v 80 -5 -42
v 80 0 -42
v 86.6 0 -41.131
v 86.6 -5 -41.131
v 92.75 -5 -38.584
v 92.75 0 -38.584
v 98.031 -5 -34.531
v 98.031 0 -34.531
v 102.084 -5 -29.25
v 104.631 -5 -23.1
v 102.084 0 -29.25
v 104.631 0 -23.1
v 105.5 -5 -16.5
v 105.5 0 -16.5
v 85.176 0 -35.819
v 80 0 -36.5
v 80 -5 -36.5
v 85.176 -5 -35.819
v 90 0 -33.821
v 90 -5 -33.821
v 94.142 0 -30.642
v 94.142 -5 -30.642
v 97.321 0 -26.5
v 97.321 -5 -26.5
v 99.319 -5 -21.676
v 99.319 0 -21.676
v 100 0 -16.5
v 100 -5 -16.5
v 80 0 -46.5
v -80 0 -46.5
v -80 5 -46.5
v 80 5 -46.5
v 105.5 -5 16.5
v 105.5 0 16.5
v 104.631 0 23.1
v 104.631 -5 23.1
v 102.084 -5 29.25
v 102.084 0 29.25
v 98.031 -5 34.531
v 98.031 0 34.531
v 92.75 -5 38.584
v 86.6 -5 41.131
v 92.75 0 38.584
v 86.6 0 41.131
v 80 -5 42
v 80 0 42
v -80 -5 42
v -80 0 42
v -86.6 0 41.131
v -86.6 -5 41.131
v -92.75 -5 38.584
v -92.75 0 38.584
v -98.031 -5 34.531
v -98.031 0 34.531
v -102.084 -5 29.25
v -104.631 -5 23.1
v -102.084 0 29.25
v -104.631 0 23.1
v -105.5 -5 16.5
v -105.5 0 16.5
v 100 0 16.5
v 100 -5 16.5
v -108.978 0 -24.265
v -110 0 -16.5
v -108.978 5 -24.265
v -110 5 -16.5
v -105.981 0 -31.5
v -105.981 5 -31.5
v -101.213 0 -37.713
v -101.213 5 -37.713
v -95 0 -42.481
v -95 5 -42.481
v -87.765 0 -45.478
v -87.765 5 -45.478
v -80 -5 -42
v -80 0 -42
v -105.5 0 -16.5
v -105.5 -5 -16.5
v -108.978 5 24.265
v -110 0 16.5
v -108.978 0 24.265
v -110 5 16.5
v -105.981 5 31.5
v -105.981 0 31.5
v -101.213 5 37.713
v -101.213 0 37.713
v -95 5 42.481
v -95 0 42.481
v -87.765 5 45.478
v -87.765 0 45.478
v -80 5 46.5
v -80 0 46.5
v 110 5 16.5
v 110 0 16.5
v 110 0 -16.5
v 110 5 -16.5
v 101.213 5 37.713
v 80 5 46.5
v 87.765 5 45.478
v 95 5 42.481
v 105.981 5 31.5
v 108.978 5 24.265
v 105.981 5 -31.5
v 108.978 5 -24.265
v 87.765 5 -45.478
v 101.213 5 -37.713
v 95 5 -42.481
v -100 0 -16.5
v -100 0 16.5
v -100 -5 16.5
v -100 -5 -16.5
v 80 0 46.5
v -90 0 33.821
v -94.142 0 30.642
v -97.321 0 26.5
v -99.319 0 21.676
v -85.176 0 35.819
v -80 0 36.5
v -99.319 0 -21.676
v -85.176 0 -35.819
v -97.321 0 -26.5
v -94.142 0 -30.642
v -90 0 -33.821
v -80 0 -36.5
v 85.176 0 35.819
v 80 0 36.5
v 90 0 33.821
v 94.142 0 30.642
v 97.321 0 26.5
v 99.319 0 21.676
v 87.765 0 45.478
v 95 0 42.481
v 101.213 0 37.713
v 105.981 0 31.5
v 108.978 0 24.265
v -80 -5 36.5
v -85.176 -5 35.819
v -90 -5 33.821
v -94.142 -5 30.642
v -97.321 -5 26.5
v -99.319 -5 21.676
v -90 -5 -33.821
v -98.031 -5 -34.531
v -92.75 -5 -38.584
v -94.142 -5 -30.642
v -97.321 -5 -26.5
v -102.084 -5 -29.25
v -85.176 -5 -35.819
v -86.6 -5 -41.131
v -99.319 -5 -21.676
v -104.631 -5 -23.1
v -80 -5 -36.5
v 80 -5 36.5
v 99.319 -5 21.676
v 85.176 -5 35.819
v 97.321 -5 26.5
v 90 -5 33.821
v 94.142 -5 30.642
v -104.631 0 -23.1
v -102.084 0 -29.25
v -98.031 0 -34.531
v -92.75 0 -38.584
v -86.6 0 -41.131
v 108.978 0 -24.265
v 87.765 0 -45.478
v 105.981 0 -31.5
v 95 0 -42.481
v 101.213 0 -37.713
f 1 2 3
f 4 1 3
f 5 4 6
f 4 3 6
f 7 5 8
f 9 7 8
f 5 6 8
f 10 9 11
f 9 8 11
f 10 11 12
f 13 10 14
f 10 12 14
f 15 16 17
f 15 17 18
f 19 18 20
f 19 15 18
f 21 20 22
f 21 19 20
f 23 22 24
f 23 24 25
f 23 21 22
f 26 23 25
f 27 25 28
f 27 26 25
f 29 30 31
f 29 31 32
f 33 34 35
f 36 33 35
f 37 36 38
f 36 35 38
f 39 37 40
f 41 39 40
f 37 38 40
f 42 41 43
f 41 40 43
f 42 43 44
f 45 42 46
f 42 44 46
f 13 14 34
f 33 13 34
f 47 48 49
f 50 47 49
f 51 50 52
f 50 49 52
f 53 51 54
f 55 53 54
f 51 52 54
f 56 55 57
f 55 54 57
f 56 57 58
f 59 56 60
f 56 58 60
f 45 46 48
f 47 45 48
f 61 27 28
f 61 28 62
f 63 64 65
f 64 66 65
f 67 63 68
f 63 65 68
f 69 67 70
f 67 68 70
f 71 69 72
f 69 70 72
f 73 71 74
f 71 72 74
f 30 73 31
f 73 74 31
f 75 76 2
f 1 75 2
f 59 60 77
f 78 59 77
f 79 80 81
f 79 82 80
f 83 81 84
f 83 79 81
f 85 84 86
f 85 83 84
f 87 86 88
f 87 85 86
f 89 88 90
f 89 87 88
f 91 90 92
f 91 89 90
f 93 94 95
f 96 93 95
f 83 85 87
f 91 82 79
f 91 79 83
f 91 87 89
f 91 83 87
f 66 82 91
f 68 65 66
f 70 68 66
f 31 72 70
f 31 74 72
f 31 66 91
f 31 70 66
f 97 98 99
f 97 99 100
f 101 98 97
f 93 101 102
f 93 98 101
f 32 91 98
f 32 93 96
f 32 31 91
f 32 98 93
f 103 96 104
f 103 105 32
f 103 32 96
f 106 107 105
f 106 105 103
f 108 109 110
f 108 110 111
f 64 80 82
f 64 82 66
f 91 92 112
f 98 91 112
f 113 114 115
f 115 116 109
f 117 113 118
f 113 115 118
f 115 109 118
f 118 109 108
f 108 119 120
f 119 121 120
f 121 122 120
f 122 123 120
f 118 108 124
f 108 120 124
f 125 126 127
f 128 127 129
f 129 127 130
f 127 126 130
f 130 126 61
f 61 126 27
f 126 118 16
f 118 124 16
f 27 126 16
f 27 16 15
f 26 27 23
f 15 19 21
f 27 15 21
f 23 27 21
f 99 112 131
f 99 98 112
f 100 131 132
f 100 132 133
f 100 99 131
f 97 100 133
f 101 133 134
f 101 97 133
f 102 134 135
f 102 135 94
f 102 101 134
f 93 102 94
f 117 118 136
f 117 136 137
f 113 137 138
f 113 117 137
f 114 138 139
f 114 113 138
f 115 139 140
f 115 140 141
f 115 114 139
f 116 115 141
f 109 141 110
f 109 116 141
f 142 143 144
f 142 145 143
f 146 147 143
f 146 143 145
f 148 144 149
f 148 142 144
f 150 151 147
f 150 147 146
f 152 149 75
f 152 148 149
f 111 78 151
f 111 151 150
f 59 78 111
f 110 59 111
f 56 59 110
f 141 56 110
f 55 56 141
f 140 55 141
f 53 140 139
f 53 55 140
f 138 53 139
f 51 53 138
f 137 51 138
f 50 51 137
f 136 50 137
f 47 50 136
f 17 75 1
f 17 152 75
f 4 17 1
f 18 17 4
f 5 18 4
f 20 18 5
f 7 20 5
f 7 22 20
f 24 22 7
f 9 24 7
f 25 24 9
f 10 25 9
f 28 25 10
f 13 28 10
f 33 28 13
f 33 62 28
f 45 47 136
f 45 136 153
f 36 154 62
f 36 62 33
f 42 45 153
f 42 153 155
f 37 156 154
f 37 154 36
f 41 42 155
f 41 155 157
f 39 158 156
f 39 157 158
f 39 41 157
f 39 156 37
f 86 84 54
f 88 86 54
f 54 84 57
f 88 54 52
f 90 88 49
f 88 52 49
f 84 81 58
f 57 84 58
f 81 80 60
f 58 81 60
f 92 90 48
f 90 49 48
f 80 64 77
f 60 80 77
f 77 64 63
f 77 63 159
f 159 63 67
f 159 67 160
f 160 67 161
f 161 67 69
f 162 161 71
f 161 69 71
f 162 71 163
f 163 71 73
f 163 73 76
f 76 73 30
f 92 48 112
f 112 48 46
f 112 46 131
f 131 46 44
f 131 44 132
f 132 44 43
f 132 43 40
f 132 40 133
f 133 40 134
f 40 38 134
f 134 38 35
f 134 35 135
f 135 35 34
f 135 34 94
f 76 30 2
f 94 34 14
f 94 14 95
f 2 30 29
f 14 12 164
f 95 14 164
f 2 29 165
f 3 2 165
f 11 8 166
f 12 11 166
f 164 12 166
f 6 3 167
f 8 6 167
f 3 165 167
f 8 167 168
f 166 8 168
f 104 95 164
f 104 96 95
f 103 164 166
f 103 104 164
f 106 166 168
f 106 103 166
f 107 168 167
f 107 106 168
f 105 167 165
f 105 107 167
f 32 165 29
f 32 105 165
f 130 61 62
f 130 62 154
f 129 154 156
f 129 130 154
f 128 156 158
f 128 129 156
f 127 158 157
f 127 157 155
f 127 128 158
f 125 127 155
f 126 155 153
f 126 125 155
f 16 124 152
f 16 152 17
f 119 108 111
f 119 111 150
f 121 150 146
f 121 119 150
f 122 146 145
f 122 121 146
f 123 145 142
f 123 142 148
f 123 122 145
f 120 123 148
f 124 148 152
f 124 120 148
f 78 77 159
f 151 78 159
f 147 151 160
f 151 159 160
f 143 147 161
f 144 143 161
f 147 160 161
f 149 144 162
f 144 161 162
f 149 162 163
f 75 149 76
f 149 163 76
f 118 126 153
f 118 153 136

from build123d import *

# Parameters (mm, degrees)
SKETCH_1_W      = 220
SKETCH_1_H      = 93
EXTRUDE_1_DEPTH = 5
FILLET_1_R      = 30
EXTRUDE_2_DEPTH = 5


with BuildPart() as part:
    # 草圖1 → 填料-伸長1 (new body)
    with BuildSketch(Plane(origin=(0, 0, 0), x_dir=(1, 0, 0), z_dir=(0, 1, 0))):
        Rectangle(SKETCH_1_W, SKETCH_1_H)
    extrude(amount=EXTRUDE_1_DEPTH)

    # 圓角1
    fillet_1_edges = [part.edges().sort_by_distance(p)[0] for p in [
        (110, 2.5, 46.5),
        (-110, 2.5, 46.5),
        (-110, 2.5, -46.5),
        (110, 2.5, -46.5),
    ]]
    fillet(fillet_1_edges, radius=FILLET_1_R)

    # 草圖2 → 填料-伸長2 (add)
    with BuildSketch(Plane.XZ):
        with BuildLine():
            Line((-80, -42), (80, -42))
            ThreePointArc((80, -42), (98.03122292, -34.53122292), (105.5, -16.5))
            Line((105.5, -16.5), (105.5, 16.5))
            ThreePointArc((105.5, 16.5), (98.03122292, 34.53122292), (80, 42))
            Line((80, 42), (-80, 42))
            ThreePointArc((-80, 42), (-98.03122292, 34.53122292), (-105.5, 16.5))
            Line((-105.5, 16.5), (-105.5, -16.5))
            ThreePointArc((-105.5, -16.5), (-98.03122292, -34.53122292), (-80, -42))
        make_face()
        with BuildLine():
            Line((-80, -36.5), (80, -36.5))
            ThreePointArc((80, -36.5), (94.142135624, -30.642135624), (100, -16.5))
            Line((100, -16.5), (100, 16.5))
            ThreePointArc((100, 16.5), (94.142135624, 30.642135624), (80, 36.5))
            Line((80, 36.5), (-80, 36.5))
            ThreePointArc((-80, 36.5), (-94.142135624, 30.642135624), (-100, 16.5))
            Line((-100, 16.5), (-100, -16.5))
            ThreePointArc((-100, -16.5), (-94.142135624, -30.642135624), (-80, -36.5))
        make_face(mode=Mode.SUBTRACT)
    extrude(amount=EXTRUDE_2_DEPTH)


solid = part.part
